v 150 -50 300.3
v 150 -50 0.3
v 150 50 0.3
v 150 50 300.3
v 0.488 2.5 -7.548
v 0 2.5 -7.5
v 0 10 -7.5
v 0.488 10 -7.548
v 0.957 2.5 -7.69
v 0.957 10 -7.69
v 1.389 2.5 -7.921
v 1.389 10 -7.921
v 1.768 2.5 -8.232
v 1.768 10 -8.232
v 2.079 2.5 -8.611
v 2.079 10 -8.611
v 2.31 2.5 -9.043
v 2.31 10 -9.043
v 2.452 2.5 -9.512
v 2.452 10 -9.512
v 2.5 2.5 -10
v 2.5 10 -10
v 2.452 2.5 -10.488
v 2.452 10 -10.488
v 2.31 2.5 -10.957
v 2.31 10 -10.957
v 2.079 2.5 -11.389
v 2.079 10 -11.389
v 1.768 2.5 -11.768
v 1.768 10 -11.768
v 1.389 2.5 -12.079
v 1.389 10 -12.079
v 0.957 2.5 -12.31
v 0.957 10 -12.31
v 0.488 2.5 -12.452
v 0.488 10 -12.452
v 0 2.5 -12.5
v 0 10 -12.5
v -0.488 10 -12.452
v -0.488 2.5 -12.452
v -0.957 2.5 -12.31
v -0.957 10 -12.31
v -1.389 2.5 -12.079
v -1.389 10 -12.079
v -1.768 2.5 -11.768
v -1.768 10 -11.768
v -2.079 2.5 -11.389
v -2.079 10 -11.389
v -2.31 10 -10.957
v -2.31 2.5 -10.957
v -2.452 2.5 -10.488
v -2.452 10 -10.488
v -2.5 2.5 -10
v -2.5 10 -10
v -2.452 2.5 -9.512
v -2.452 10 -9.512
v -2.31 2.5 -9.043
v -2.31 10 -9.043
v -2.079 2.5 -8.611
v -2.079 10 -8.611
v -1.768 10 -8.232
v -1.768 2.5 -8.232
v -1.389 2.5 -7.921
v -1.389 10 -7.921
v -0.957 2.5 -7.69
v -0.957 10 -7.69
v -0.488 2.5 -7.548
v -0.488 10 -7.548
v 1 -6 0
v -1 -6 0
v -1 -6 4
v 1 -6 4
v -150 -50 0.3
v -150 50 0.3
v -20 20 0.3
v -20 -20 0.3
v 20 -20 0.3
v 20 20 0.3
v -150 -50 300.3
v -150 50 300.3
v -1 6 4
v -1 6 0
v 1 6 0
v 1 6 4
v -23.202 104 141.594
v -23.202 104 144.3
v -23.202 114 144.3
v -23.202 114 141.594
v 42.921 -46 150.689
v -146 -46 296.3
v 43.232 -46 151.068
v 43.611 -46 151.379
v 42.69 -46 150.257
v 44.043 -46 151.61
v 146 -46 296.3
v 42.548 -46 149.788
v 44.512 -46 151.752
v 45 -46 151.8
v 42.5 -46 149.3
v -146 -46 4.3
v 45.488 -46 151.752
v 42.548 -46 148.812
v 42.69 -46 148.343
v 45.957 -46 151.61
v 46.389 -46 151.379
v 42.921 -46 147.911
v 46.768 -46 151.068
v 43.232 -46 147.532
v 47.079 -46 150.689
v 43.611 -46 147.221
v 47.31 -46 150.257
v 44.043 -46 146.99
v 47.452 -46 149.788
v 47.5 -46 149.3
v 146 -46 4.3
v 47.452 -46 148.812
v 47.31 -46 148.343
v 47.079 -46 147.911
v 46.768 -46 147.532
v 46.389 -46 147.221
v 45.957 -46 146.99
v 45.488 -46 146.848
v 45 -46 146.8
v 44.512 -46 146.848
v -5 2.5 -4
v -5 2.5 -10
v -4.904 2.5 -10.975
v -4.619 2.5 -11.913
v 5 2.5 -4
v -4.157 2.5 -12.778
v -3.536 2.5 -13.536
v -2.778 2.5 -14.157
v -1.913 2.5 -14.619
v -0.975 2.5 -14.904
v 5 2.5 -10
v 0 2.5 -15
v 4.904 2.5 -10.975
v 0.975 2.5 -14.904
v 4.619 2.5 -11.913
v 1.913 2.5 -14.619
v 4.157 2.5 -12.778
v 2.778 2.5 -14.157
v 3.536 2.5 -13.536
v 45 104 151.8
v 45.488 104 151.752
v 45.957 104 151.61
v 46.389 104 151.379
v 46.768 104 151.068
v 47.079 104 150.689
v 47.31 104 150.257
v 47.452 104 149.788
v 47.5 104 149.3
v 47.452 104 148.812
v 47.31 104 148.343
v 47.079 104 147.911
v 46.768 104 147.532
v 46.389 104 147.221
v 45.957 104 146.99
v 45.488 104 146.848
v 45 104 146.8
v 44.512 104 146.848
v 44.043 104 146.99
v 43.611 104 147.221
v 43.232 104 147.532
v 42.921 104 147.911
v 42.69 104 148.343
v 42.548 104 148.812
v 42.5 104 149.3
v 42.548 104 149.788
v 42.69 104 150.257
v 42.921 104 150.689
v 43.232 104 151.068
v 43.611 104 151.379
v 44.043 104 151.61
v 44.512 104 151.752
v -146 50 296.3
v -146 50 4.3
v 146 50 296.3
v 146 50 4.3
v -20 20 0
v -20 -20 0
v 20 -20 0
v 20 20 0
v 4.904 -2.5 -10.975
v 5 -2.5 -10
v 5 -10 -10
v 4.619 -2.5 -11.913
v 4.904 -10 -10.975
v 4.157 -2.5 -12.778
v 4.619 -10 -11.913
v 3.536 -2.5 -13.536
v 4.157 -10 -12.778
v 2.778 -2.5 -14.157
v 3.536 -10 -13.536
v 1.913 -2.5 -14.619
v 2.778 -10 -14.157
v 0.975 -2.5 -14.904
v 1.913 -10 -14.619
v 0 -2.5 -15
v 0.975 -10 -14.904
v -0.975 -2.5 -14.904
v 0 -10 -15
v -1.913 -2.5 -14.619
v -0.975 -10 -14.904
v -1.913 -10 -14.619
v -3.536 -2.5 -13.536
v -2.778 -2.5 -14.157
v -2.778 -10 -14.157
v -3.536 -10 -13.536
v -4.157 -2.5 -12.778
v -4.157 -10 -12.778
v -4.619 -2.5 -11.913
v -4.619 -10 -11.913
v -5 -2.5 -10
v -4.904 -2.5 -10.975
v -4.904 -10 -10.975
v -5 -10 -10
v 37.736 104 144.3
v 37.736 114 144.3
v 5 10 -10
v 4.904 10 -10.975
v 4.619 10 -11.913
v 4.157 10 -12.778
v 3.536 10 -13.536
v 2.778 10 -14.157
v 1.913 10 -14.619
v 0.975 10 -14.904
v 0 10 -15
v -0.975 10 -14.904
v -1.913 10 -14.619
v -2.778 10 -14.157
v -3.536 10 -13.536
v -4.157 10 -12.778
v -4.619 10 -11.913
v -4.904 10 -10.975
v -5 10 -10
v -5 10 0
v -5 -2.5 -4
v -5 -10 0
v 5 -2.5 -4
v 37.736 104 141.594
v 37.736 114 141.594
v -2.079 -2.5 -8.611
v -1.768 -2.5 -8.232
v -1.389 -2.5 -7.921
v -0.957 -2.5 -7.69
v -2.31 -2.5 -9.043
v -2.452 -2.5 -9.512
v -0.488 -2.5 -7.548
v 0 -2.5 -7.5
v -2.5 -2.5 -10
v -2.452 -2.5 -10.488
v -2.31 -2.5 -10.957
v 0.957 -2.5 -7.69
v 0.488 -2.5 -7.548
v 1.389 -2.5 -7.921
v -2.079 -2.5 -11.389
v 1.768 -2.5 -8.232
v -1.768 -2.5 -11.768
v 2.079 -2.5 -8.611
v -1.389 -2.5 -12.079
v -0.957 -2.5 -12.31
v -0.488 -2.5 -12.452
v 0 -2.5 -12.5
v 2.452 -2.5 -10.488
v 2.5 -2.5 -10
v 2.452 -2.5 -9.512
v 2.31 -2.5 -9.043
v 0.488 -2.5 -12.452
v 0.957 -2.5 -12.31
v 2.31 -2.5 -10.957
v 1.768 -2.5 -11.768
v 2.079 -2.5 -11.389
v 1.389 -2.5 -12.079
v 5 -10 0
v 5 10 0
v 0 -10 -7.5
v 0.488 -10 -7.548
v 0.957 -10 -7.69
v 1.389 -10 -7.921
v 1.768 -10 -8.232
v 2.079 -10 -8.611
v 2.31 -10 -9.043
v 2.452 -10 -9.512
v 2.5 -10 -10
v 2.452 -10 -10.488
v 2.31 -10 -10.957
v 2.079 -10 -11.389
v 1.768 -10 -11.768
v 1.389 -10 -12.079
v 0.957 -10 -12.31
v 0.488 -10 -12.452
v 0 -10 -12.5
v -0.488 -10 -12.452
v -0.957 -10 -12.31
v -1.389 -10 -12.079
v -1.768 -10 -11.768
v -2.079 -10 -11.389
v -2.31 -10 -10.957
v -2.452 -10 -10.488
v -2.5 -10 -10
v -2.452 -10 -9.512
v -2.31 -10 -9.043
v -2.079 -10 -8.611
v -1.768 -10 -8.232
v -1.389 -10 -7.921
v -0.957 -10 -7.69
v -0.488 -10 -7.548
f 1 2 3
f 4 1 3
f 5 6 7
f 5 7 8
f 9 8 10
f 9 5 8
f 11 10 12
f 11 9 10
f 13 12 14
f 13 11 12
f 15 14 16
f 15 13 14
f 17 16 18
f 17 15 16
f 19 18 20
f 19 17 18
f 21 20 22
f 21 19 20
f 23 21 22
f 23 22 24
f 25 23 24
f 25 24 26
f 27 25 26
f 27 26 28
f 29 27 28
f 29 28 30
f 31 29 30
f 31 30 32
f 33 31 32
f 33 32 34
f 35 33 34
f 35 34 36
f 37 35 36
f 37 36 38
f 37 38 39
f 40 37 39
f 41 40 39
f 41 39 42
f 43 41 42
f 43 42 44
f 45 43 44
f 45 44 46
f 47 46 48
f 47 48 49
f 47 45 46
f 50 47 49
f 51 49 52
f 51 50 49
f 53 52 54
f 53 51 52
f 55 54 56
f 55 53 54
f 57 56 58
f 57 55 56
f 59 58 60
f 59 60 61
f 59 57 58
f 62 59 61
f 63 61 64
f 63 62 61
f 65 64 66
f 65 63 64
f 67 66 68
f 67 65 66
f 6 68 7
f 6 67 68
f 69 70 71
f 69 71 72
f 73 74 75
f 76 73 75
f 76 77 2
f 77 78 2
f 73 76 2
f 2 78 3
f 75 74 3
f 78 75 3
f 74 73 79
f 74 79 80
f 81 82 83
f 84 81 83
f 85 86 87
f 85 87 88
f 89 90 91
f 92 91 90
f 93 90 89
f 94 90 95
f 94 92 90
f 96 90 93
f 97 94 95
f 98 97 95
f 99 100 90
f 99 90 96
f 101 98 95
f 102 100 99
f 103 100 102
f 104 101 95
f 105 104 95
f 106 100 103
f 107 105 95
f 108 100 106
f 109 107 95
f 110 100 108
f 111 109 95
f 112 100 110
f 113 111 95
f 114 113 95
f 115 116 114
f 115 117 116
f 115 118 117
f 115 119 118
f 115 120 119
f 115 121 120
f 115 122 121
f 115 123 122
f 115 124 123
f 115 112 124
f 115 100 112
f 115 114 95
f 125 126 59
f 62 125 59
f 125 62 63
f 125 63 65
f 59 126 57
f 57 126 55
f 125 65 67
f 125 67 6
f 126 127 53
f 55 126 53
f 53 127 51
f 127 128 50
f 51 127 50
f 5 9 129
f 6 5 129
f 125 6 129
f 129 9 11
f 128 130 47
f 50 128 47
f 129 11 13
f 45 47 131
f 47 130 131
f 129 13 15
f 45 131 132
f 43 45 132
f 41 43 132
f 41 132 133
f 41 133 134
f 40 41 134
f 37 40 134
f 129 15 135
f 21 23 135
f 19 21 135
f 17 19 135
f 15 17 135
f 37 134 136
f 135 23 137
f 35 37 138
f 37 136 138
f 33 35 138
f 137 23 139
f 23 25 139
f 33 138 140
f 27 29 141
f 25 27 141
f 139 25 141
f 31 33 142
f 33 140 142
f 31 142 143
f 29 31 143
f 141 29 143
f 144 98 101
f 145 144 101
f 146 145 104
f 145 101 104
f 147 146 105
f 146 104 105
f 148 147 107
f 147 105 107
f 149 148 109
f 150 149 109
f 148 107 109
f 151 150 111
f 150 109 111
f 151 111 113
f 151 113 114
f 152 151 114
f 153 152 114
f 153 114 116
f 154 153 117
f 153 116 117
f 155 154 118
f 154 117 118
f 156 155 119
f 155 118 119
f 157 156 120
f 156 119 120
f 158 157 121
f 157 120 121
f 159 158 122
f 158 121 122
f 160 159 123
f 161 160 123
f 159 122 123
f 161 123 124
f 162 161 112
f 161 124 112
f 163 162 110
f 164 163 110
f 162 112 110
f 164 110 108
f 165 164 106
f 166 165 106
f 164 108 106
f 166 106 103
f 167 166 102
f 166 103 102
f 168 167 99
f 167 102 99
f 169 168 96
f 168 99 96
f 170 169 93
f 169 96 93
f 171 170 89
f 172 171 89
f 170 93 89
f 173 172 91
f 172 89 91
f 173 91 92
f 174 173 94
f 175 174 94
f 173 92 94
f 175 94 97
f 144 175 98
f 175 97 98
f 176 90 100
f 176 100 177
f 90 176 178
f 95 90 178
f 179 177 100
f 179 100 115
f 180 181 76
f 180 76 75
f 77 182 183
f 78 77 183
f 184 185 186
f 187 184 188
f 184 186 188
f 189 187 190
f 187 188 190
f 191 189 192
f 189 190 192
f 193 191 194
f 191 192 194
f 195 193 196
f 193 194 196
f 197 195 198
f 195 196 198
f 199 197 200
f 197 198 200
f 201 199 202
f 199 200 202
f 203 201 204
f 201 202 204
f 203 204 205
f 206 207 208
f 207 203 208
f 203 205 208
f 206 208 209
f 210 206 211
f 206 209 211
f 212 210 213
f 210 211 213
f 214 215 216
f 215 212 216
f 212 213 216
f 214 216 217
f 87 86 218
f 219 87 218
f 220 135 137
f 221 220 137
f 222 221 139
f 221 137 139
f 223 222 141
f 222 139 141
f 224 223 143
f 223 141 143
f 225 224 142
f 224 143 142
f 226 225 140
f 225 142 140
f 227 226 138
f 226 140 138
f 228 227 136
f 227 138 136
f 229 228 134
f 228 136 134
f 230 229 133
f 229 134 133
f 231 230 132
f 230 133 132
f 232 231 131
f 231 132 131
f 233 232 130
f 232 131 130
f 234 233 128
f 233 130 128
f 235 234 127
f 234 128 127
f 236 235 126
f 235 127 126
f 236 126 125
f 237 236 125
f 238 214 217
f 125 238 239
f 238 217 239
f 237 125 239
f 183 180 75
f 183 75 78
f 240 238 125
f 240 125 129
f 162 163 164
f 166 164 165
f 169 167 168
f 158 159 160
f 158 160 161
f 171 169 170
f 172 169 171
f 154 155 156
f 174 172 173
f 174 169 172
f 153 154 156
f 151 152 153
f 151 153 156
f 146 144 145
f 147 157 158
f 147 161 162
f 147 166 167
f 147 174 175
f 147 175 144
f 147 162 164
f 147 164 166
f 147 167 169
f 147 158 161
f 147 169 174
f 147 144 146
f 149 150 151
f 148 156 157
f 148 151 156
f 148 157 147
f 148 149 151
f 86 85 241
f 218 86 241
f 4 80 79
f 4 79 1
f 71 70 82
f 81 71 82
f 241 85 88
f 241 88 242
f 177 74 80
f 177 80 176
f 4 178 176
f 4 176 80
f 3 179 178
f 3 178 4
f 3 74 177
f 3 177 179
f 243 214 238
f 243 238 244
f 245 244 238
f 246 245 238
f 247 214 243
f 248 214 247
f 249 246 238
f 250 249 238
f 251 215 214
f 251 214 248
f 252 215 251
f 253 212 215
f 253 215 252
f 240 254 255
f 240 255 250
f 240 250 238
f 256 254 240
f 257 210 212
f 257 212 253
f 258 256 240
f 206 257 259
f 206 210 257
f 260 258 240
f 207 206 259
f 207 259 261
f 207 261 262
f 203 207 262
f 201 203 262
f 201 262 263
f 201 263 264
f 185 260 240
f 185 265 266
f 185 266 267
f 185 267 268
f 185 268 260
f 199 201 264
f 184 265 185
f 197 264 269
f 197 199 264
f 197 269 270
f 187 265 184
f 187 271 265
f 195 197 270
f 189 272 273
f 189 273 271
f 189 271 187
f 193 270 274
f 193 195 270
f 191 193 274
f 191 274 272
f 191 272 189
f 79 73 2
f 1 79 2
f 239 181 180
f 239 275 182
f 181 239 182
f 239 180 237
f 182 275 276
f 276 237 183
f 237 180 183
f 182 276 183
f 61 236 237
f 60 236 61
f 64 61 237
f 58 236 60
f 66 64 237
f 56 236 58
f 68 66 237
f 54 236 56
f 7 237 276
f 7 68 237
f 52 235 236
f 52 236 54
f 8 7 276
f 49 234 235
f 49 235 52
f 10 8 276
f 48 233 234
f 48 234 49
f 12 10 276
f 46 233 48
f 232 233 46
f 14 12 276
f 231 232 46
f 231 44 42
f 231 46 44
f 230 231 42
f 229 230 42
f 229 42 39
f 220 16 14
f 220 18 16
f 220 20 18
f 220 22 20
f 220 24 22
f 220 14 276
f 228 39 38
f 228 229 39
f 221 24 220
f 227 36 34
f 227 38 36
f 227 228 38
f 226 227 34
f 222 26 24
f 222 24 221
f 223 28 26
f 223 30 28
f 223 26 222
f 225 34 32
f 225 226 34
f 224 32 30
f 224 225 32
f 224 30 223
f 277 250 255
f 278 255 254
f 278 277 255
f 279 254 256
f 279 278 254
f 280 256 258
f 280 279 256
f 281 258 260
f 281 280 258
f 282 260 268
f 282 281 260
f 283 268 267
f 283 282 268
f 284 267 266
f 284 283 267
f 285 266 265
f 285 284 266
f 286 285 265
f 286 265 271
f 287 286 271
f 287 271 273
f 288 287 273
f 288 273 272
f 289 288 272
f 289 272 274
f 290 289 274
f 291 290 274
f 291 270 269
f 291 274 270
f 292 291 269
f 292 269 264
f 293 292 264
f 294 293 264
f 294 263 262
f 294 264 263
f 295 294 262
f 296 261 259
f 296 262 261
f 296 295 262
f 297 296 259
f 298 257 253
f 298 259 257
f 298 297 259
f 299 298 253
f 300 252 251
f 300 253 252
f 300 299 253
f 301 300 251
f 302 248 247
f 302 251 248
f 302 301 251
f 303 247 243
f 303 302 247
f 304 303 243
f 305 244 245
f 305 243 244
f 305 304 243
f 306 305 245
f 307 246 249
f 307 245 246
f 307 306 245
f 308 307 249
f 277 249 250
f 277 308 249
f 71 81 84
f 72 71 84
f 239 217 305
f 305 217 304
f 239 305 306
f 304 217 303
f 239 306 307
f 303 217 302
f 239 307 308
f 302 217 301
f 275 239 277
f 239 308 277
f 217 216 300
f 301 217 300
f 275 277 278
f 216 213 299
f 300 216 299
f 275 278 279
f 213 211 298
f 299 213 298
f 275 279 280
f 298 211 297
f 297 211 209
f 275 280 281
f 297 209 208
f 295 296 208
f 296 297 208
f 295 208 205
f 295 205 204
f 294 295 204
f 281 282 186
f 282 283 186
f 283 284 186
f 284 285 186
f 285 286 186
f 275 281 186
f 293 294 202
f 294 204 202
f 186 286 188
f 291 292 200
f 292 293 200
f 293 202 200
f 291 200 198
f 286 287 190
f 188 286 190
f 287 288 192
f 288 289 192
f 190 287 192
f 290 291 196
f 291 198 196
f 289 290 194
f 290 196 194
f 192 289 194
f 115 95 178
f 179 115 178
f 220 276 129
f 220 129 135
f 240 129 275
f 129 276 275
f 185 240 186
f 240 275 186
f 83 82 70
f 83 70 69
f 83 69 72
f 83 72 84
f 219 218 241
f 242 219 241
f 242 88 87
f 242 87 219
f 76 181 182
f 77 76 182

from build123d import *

# Parameters (mm, degrees)
CROQUIS1_W                   = 40
CROQUIS1_H                   = 40
SALIENTE_EXTRUIR1_DEPTH      = 0.3
SALIENTE_EXTRUIR2_DEPTH      = 10
SALIENTE_EXTRUIR2_DEPTH_BACK = 10
CROQUIS2_R                   = 2.5
CORTAR_EXTRUIR1_DEPTH        = 2.5
CORTAR_EXTRUIR1_DEPTH_BACK   = 2.5
CROQUIS3_W                   = 14.056155144
CROQUIS3_H                   = 12
CROQUIS4_W                   = 300
CROQUIS4_H                   = 100
SALIENTE_EXTRUIR3_DEPTH      = 300
VACIADO2_START               = 4.3
VACIADO2_OUTLINE_W           = 292
VACIADO2_OUTLINE_H           = 96
VACIADO2_DEPTH               = 292
VACIADO2_START_2             = 4
VACIADO2_2_OUTLINE_W         = 32
VACIADO2_2_OUTLINE_H         = 32
VACIADO2_2_DEPTH             = 0.3
VACIADO2_3_OUTLINE_W         = 2
VACIADO2_3_OUTLINE_H         = 12
VACIADO2_3_DEPTH             = 4
CROQUIS6_W                   = 32
CROQUIS6_H                   = 32
SALIENTE_EXTRUIR4_DEPTH      = 0.3
CROQUIS7_R                   = 2.5
SALIENTE_EXTRUIR5_DEPTH      = 150
CROQUIS8_W                   = 60.937965474
CROQUIS8_H                   = 2.7059869
SALIENTE_EXTRUIR6_DEPTH      = 10


# Read off the part's stored shape, not the designer's step: Vaciado2
with BuildPart() as part:
    # Croquis1 → Saliente-Extruir1 (new body)
    with BuildSketch(Plane.XY):
        Rectangle(CROQUIS1_W, CROQUIS1_H)
    extrude(amount=SALIENTE_EXTRUIR1_DEPTH)

    # Croquis2 → Saliente-Extruir2 (add, two sides: drawn at the far end of the back side and taken through both)
    with BuildSketch(Plane(origin=(0, 0, 0), x_dir=(1, 0, 0), z_dir=(0, 1, 0)).offset(-SALIENTE_EXTRUIR2_DEPTH_BACK)):
        with BuildLine():
            Line((-5, 10), (-5, 0))
            Line((-5, 0), (5, 0))
            Line((5, 0), (5, 10))
            ThreePointArc((5, 10), (0, 15), (-5, 10))
        make_face()
        with Locations(Location((0, 10, 0), (0, 0, 270))):
            Circle(CROQUIS2_R, mode=Mode.SUBTRACT)
    extrude(amount=SALIENTE_EXTRUIR2_DEPTH + SALIENTE_EXTRUIR2_DEPTH_BACK)

    # Croquis3 → Cortar-Extruir1 (cut, two sides: drawn at the far end of the back side and taken through both)
    with BuildSketch(Plane(origin=(0, 0, 0), x_dir=(1, 0, 0), z_dir=(0, 1, 0)).offset(-CORTAR_EXTRUIR1_DEPTH_BACK)):
        with Locations((0, 10)):
            Rectangle(CROQUIS3_W, CROQUIS3_H)
    extrude(amount=CORTAR_EXTRUIR1_DEPTH + CORTAR_EXTRUIR1_DEPTH_BACK, mode=Mode.SUBTRACT)

    # Croquis4 → Saliente-Extruir3 (add)
    with BuildSketch(Plane.XY.offset(0.3)):
        Rectangle(CROQUIS4_W, CROQUIS4_H)
    extrude(amount=SALIENTE_EXTRUIR3_DEPTH)

    # Vaciado2 outline → Vaciado2 (cut)
    with BuildSketch(Plane.XY.offset(VACIADO2_START)):
        with Locations((0, 2)):
            Rectangle(VACIADO2_OUTLINE_W, VACIADO2_OUTLINE_H)
    extrude(amount=VACIADO2_DEPTH, mode=Mode.SUBTRACT)

    # Vaciado2 2 outline → Vaciado2 2 (cut)
    with BuildSketch(Plane.XY.offset(VACIADO2_START_2)):
        Rectangle(VACIADO2_2_OUTLINE_W, VACIADO2_2_OUTLINE_H)
    extrude(amount=VACIADO2_2_DEPTH, mode=Mode.SUBTRACT)

    # Vaciado2 3 outline → Vaciado2 3 (cut)
    with BuildSketch(Plane.XY):
        Rectangle(VACIADO2_3_OUTLINE_W, VACIADO2_3_OUTLINE_H)
    extrude(amount=VACIADO2_3_DEPTH, mode=Mode.SUBTRACT)

    # Croquis6 → Saliente-Extruir4 (add)
    with BuildSketch(Plane.XY.offset(4)):
        Rectangle(CROQUIS6_W, CROQUIS6_H)
    extrude(amount=SALIENTE_EXTRUIR4_DEPTH)

    # Croquis7 → Saliente-Extruir5 (add)
    with BuildSketch(Plane(origin=(0, -46, 0), x_dir=(1, 0, 0), z_dir=(0, 1, 0))):
        with Locations(Location((45, -149.3, 0), (0, 0, 270))):
            Circle(CROQUIS7_R)
    extrude(amount=SALIENTE_EXTRUIR5_DEPTH)


with BuildPart() as body_2:
    # Croquis8 → Saliente-Extruir6 (new body)
    with BuildSketch(Plane(origin=(0, 104, 0), x_dir=(1, 0, 0), z_dir=(0, 1, 0))):
        with Locations((7.266795091, -142.94700655)):
            Rectangle(CROQUIS8_W, CROQUIS8_H)
    extrude(amount=SALIENTE_EXTRUIR6_DEPTH)


solid = Compound([part.part, body_2.part])
